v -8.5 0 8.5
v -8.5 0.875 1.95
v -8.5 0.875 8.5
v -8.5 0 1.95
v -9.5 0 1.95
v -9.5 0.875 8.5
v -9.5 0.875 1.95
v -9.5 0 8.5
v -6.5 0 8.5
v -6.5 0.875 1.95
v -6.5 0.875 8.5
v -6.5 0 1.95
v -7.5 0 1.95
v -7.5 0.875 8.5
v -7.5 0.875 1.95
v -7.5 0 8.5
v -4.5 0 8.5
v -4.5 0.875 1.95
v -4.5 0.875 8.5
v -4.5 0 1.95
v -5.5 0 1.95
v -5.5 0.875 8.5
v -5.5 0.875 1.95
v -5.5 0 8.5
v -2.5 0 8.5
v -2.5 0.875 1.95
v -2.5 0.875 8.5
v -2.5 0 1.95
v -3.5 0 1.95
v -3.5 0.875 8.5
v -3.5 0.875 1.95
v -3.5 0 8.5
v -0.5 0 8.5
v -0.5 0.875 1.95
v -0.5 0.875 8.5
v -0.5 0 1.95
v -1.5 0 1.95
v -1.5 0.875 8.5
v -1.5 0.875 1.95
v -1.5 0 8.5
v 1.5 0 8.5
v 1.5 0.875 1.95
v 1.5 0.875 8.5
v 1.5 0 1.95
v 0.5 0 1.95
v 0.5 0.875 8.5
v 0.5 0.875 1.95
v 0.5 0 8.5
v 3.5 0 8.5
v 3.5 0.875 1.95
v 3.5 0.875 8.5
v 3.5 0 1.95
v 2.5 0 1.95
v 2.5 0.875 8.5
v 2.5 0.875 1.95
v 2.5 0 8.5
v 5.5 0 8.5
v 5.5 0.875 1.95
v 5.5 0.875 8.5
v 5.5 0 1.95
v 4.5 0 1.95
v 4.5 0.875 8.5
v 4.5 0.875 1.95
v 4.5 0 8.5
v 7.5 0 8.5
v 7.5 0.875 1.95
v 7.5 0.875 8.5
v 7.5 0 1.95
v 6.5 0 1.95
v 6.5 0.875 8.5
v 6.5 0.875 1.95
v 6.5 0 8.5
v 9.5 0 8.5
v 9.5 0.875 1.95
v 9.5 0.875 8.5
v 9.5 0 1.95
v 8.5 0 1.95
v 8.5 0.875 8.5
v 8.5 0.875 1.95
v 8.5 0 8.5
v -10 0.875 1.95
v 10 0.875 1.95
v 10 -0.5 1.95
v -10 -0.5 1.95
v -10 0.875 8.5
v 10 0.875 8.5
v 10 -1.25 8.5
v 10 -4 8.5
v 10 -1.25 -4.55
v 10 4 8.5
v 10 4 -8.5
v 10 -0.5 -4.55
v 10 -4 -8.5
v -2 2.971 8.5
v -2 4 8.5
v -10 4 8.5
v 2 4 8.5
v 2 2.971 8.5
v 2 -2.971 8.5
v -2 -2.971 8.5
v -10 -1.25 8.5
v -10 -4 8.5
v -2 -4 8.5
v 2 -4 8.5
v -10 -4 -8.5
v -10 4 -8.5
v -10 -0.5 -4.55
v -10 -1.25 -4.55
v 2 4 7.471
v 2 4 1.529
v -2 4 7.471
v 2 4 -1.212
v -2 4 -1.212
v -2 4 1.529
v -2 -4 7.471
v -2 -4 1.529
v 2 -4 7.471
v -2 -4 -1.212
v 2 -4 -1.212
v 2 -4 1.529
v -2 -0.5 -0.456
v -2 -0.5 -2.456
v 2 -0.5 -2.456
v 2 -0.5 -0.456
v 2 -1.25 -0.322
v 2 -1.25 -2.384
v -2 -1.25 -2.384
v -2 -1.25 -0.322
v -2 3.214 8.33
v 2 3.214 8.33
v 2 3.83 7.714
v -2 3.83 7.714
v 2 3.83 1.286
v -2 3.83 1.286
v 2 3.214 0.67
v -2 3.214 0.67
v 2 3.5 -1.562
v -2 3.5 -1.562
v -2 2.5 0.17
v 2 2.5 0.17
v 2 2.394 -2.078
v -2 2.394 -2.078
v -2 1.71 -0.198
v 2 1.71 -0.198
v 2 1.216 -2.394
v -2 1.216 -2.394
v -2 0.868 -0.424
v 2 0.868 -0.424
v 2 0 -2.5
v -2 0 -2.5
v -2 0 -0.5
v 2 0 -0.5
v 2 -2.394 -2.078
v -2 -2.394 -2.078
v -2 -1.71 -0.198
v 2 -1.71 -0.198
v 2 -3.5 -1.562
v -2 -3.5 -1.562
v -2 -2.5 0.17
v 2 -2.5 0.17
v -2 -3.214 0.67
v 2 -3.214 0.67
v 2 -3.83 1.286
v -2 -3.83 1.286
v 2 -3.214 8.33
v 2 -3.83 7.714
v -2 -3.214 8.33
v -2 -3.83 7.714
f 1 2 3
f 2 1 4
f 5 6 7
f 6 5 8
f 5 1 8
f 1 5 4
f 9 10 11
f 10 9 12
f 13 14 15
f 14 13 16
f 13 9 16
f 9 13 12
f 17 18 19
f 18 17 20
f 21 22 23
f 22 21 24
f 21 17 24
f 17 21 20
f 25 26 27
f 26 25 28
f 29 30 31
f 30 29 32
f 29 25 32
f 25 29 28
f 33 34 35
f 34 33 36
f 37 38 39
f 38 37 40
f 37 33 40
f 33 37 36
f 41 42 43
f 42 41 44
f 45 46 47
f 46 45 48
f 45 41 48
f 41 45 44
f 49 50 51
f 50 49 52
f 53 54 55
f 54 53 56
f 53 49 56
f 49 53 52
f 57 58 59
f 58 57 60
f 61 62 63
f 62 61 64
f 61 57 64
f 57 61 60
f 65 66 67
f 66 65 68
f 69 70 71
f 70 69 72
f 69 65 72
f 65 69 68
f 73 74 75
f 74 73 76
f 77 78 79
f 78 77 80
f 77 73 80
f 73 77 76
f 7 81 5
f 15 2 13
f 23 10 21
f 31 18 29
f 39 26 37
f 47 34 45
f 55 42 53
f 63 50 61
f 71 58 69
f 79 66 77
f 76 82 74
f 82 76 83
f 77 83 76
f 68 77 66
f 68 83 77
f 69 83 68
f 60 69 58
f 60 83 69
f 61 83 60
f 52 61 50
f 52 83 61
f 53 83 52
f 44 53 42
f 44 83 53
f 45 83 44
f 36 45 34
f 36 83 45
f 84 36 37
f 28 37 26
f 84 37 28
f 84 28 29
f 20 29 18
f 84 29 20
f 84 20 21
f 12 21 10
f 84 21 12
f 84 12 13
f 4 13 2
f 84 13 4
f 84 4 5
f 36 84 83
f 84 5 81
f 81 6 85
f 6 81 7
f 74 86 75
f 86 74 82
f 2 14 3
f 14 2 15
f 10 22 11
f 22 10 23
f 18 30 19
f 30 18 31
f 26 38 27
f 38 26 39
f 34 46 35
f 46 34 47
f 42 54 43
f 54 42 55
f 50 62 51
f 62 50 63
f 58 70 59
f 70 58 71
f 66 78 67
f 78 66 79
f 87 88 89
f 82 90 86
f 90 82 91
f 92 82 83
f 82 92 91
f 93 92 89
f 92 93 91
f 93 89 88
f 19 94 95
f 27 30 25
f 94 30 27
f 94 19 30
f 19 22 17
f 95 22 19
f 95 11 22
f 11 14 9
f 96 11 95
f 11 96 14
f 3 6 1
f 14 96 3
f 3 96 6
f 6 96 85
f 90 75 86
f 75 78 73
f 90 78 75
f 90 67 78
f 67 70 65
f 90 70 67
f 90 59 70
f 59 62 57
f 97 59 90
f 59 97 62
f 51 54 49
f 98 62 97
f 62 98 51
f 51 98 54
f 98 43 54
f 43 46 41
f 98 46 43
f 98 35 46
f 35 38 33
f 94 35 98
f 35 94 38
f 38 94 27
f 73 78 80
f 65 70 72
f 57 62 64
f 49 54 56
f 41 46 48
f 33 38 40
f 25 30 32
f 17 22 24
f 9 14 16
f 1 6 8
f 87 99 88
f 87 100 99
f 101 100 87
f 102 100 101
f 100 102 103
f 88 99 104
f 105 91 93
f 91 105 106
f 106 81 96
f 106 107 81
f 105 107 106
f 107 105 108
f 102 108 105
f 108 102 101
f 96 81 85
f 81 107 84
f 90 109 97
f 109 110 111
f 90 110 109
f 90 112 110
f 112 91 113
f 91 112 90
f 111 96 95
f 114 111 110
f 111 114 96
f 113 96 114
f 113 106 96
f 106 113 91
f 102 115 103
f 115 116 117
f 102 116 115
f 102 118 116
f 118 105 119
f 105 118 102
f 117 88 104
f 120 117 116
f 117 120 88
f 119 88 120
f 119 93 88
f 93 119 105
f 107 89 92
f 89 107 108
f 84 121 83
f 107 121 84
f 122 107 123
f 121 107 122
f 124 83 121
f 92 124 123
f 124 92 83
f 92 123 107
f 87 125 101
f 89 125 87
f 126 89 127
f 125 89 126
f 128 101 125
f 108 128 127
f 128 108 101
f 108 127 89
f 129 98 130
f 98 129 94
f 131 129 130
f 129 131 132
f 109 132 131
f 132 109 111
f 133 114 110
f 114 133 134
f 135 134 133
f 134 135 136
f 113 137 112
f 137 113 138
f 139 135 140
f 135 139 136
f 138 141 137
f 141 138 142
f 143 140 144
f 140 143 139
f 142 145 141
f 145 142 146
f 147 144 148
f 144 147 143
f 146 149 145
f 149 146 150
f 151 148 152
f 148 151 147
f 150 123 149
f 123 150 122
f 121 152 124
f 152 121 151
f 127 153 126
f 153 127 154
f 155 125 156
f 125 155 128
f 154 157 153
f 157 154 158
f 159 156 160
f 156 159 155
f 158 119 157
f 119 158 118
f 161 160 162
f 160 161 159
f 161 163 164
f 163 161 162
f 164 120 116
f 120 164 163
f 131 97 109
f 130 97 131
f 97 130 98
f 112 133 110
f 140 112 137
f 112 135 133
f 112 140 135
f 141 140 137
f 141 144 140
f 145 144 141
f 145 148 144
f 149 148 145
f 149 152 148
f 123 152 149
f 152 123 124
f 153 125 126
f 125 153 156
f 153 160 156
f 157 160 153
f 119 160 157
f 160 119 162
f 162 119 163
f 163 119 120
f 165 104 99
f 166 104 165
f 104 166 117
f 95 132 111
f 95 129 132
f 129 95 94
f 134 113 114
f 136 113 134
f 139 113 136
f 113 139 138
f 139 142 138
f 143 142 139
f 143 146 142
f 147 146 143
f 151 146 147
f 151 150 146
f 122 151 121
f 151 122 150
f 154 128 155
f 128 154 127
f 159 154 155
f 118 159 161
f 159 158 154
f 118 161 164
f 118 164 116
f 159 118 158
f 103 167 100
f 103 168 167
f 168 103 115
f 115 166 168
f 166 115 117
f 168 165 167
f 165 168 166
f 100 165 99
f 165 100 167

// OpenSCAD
in = 25.4;

motor_w = 42.3;
motor_rad = 26.25;
motor_screw_sep = 31;
motor_screw_rad = 3.33/2;
motor_screw_cap_rad = 3.33;
motor_center_rad = 13;

spring_inner_rad = 18/2;
spring_outer_rad = 22/2;
spring_height = 13;

spring_nut_rad = 15/2;
spring_nut_height = 7;
spring_screw_rad = 8.7/2;
    
idler_screw_rad = 5/2+.2;
idler_lift = 3;
idler_inner_rad = idler_screw_rad+1.5;
    
    
belt_thick = 2;
belt_width = 6;

//corner_mount(motor=true);
//corner_mount(motor=false);
//magnet_mount();
//drill_guide();
//spring_roller();
belt_clamp();

wall = 4;

$fn=36;

module belt_clamp(){
    belt_thick = belt_thick - .25;
    length = 20;
    difference(){
        union(){
            //body
            cube([length,wall*2,wall+spring_height], center=true);
        }
        
        //belt clamp up top
        translate([0,0,spring_height/4+wall/2]) difference(){
            cube([length+1, belt_thick, spring_height/2+.1], center=true);
            for(i=[-length-1:2:length]) translate([i,belt_thick/2,0]) cube([1,belt_thick,spring_height/2+.3], center=true);
        }
        
        //spring right next to belt
        translate([0,-belt_thick/2,wall/2]) cube([length+1, .75, spring_height+.1], center=true);
        
        //zip tie through the spring & around the top
        translate([0,0,6-1.5]) rotate([0,90,0]) rotate_extrude(){
            translate([6,0,0]) square([2,4], center=true);
        }
    }
}

module spring_roller(roller_height=20){
    roller_rad = spring_inner_rad+wall-2;
    
    spring_inner_rad = spring_inner_rad-.25;    //add a little extra slop
    difference(){
        union(){
            cylinder(r=roller_rad, h=roller_height);
        }
        
        translate([0,0,roller_height/2]) difference(){
            
            %cylinder(r=20, h=spring_height, center=true);
            
            rotate_extrude(){
                translate([spring_inner_rad+wall/2+.1,0,0]) square([wall+.2, spring_height+wall*2], center=true);
            }
            
            //chamfer top and bottom
            for(i=[0,1]) mirror([0,0,i]) translate([0,0,-(spring_height+wall*2)/2-.1]) cylinder(r1=spring_inner_rad+wall, r2=spring_inner_rad, h=wall+.1);
        }
        
        translate([0,0,-.1]) cylinder(r=spring_screw_rad+.2, h=roller_height+.2);
    }
}

module magnet_mount(){
    magnet_len = in*.5;
    magnet_rad = (5/16*in)/2 + .2;
    
    
    
    belt_thick = 2;
    belt_width = 6.5;
    
    belt_offset = 11;
    base_offset = 19;
    belt_lift = 10; //this is specifically to lift the belt up, to counteract gravity pulling the carriage down.  Not sure it's worth the effort, though.
    
    
    //neopixel 16x ring
    led_rad = 32/2;
    led_thick = 7;
    led_width = (44.5-31.7)/2+.25;
    
    //cylinder(r=led_rad, h=50);
    
    //led ring?
    %translate([0,0,wall]) 
    rotate_extrude(){
        translate([led_rad,0,0]) square([led_width,led_thick]);
    }
    
    
    difference(){
        union(){
            //base()
            for(j=[0,90]) rotate([0,0,j]) hull() for(i=[0,1]) mirror([i,0,0]) translate([base_offset,0,0]) scale([.5,1,1]) {
               
                cylinder(r1=magnet_rad+wall*1.5, r2=magnet_rad+wall*2, h=wall/3);
                translate([0,0,wall/3-.01]) cylinder(r=magnet_rad+wall*2, h=wall/3+.01);
                translate([0,0,wall*2/3-.01]) cylinder(r1=magnet_rad+wall*2, r2=magnet_rad+wall*1.5, h=wall/3+.01);
            }
        
            //magnet
            cylinder(r1=magnet_rad+wall, r2=magnet_rad+wall/2, h=magnet_len+wall);
            
            //belt holder
            for(i=[0,1]) mirror([i,0,0]) translate([belt_offset,0,0]) scale([.5,1,1]) cylinder(r=magnet_rad+wall, h=wall+belt_width+belt_lift);
                
            //brace the belt holder
            hull() for(i=[0,1]) mirror([i,0,0]) translate([belt_offset,0,0]) scale([.5,1,1]) cylinder(r=magnet_rad+wall, h=wall*3);
        }
        
        //magnet
        translate([0,0,-.1]) cylinder(r1=magnet_rad+1, r2=magnet_rad, h=1);
        translate([0,0,-.1]) cylinder(r1=magnet_rad+.2, r2=magnet_rad, h=magnet_len+.2);
        translate([0,0,magnet_len]) cube([magnet_rad*2+wall*1.25,magnet_rad,wall*2+.1], center=true);
        
        //belt cutout
        for(i=[0,1]) mirror([i,0,0]) translate([belt_offset,0,wall]) scale([.5,1,1]) union(){
            //horizontal
            difference(){
                //horizontal
                rotate_extrude(){
                    translate([magnet_rad+wall-belt_thick+.1,0,0]) square([belt_thick,belt_width*2+belt_lift]);
                }
                translate([0,0,-.1]) cylinder(r1=magnet_rad+wall*2, r2=magnet_rad, h=belt_lift+wall);
            }
            
            //zip tie slot
            translate([0,0,belt_lift]) rotate([90,0,0]) rotate_extrude(){
                translate([magnet_len/2+1.5,0,0]) square([2,4], center=true);
            }
        }
    }
}
module motor_mount(solid=1, screw_seat=1){
    
    //%cube([motor_w, motor_w, .1], center=true);
    
    motor_wall = (motor_w-motor_screw_sep)/2;
    
    if(solid == 1){
        //body
        intersection(){
            hull() for(i=[0:1]) for(j=[0:1]) mirror([i,0,0]) mirror([0,j,0])
                translate([motor_screw_sep/2,motor_screw_sep/2,0]) cylinder(r=motor_wall, h=wall);
            cylinder(r=motor_rad, h=wall);
        }
        
        //raised area for screws
        for(i=[0:1]) for(j=[0:1]) mirror([i,0,0]) mirror([0,j,0])
                translate([motor_screw_sep/2,motor_screw_sep/2,0]) cylinder(r=motor_screw_cap_rad, h=wall+screw_seat);
    }else{
        //center hole
        translate([0,0,-.1]) cylinder(r=motor_center_rad, h=wall+.2);
        
        //screw holes
        for(i=[0:1]) for(j=[0:1]) mirror([i,0,0]) mirror([0,j,0])
                translate([motor_screw_sep/2,motor_screw_sep/2,-.1]) cylinder(r=motor_screw_rad, h=wall+screw_seat+.2);
    }
}

module drill_guide(){
    difference(){
        union(){
            hull(){
                motor_mount();
                for(i=[0,90]) rotate([0,0,i]) translate([0,-motor_w/2-wall/2-.1,wall/2]) cube([motor_w, wall, wall], center=true);
            }
            
            for(i=[0,90]) rotate([0,0,i]) translate([0,-motor_w/2-wall/2-.1,wall]) cube([motor_w-1, wall, wall*2], center=true);
        }
        difference(){
            scale([1,1,2]) motor_mount(solid=-1);
            for(i=[0:120:359]) rotate([0,0,i]) translate([motor_center_rad/2, 0, 0]) cube([motor_center_rad*1.1, wall*2, wall*3], center=true);
        }
        
        cylinder(r=idler_screw_rad, h=wall*3, center=true);
    }
}

//modified motor mount - one corner is a belt guide
module corner_mount(motor=true){
    screw_seat = 1;
    spring_offset = motor_w;

    
    belt_guide_offset = motor_screw_sep/(sqrt(2));
    
    difference(){
        union(){
            //base
            hull(){
                motor_mount(solid=1, screw_seat=0);
                
                //base for the spring mount
                translate([spring_offset,0,0]) cylinder(r=spring_outer_rad+wall, h=wall);
            }
            hull(){
                motor_mount(solid=1, screw_seat=0);
                
                //base for the belt guide
                rotate([0,0,-45]) translate([belt_guide_offset,0,0]) cylinder(r=belt_thick+wall, h=wall);
            }
            motor_mount(solid=1, screw_seat=screw_seat);
            
            //belt guide
            rotate([0,0,-45]) translate([belt_guide_offset,0,wall-.1]) cylinder(r=belt_thick+wall, h=belt_width+wall+.1);
            rotate([0,0,-45]) translate([belt_guide_offset,0,wall+belt_width+wall]) sphere(r=belt_thick+wall);
            
            //idler mount lift
            if(motor == false){
                translate([0,0,wall-.1]) cylinder(r1=idler_inner_rad+wall, r2=idler_inner_rad, h=idler_lift+.1);
            }
            
            //spring mount peg
            translate([spring_offset,0,wall-.1]) cylinder(r1=spring_outer_rad+wall, r2=spring_outer_rad, h=spring_nut_height+.1);
        }
        
        //motor holes
        if(motor == true){
            motor_mount(solid=0, screw_seat=screw_seat);
        }else{
            motor_mount(solid=0, screw_seat=screw_seat, motor_center_rad = idler_screw_rad);
            translate([0,0,-.1]) cylinder(r=idler_screw_rad, h=wall*4);
        }
        
        //belt hole
        rotate([0,0,-45]) translate([belt_guide_offset,0,wall+(belt_width+wall)/2]) cube([(belt_thick+wall+.1)*2,belt_thick+.5,belt_width+wall/2], center=true);
        
        //spring holes
        translate([spring_offset,0,-.2]) cylinder(r1=spring_nut_rad+.125, r2=spring_nut_rad, h=spring_nut_height, $fn=6);
        translate([spring_offset,0,spring_nut_height]) cylinder(r=spring_screw_rad, h=wall*2);
    }
}

module corner_mount_spring(){
}

module corner_mount_weight(){
}
